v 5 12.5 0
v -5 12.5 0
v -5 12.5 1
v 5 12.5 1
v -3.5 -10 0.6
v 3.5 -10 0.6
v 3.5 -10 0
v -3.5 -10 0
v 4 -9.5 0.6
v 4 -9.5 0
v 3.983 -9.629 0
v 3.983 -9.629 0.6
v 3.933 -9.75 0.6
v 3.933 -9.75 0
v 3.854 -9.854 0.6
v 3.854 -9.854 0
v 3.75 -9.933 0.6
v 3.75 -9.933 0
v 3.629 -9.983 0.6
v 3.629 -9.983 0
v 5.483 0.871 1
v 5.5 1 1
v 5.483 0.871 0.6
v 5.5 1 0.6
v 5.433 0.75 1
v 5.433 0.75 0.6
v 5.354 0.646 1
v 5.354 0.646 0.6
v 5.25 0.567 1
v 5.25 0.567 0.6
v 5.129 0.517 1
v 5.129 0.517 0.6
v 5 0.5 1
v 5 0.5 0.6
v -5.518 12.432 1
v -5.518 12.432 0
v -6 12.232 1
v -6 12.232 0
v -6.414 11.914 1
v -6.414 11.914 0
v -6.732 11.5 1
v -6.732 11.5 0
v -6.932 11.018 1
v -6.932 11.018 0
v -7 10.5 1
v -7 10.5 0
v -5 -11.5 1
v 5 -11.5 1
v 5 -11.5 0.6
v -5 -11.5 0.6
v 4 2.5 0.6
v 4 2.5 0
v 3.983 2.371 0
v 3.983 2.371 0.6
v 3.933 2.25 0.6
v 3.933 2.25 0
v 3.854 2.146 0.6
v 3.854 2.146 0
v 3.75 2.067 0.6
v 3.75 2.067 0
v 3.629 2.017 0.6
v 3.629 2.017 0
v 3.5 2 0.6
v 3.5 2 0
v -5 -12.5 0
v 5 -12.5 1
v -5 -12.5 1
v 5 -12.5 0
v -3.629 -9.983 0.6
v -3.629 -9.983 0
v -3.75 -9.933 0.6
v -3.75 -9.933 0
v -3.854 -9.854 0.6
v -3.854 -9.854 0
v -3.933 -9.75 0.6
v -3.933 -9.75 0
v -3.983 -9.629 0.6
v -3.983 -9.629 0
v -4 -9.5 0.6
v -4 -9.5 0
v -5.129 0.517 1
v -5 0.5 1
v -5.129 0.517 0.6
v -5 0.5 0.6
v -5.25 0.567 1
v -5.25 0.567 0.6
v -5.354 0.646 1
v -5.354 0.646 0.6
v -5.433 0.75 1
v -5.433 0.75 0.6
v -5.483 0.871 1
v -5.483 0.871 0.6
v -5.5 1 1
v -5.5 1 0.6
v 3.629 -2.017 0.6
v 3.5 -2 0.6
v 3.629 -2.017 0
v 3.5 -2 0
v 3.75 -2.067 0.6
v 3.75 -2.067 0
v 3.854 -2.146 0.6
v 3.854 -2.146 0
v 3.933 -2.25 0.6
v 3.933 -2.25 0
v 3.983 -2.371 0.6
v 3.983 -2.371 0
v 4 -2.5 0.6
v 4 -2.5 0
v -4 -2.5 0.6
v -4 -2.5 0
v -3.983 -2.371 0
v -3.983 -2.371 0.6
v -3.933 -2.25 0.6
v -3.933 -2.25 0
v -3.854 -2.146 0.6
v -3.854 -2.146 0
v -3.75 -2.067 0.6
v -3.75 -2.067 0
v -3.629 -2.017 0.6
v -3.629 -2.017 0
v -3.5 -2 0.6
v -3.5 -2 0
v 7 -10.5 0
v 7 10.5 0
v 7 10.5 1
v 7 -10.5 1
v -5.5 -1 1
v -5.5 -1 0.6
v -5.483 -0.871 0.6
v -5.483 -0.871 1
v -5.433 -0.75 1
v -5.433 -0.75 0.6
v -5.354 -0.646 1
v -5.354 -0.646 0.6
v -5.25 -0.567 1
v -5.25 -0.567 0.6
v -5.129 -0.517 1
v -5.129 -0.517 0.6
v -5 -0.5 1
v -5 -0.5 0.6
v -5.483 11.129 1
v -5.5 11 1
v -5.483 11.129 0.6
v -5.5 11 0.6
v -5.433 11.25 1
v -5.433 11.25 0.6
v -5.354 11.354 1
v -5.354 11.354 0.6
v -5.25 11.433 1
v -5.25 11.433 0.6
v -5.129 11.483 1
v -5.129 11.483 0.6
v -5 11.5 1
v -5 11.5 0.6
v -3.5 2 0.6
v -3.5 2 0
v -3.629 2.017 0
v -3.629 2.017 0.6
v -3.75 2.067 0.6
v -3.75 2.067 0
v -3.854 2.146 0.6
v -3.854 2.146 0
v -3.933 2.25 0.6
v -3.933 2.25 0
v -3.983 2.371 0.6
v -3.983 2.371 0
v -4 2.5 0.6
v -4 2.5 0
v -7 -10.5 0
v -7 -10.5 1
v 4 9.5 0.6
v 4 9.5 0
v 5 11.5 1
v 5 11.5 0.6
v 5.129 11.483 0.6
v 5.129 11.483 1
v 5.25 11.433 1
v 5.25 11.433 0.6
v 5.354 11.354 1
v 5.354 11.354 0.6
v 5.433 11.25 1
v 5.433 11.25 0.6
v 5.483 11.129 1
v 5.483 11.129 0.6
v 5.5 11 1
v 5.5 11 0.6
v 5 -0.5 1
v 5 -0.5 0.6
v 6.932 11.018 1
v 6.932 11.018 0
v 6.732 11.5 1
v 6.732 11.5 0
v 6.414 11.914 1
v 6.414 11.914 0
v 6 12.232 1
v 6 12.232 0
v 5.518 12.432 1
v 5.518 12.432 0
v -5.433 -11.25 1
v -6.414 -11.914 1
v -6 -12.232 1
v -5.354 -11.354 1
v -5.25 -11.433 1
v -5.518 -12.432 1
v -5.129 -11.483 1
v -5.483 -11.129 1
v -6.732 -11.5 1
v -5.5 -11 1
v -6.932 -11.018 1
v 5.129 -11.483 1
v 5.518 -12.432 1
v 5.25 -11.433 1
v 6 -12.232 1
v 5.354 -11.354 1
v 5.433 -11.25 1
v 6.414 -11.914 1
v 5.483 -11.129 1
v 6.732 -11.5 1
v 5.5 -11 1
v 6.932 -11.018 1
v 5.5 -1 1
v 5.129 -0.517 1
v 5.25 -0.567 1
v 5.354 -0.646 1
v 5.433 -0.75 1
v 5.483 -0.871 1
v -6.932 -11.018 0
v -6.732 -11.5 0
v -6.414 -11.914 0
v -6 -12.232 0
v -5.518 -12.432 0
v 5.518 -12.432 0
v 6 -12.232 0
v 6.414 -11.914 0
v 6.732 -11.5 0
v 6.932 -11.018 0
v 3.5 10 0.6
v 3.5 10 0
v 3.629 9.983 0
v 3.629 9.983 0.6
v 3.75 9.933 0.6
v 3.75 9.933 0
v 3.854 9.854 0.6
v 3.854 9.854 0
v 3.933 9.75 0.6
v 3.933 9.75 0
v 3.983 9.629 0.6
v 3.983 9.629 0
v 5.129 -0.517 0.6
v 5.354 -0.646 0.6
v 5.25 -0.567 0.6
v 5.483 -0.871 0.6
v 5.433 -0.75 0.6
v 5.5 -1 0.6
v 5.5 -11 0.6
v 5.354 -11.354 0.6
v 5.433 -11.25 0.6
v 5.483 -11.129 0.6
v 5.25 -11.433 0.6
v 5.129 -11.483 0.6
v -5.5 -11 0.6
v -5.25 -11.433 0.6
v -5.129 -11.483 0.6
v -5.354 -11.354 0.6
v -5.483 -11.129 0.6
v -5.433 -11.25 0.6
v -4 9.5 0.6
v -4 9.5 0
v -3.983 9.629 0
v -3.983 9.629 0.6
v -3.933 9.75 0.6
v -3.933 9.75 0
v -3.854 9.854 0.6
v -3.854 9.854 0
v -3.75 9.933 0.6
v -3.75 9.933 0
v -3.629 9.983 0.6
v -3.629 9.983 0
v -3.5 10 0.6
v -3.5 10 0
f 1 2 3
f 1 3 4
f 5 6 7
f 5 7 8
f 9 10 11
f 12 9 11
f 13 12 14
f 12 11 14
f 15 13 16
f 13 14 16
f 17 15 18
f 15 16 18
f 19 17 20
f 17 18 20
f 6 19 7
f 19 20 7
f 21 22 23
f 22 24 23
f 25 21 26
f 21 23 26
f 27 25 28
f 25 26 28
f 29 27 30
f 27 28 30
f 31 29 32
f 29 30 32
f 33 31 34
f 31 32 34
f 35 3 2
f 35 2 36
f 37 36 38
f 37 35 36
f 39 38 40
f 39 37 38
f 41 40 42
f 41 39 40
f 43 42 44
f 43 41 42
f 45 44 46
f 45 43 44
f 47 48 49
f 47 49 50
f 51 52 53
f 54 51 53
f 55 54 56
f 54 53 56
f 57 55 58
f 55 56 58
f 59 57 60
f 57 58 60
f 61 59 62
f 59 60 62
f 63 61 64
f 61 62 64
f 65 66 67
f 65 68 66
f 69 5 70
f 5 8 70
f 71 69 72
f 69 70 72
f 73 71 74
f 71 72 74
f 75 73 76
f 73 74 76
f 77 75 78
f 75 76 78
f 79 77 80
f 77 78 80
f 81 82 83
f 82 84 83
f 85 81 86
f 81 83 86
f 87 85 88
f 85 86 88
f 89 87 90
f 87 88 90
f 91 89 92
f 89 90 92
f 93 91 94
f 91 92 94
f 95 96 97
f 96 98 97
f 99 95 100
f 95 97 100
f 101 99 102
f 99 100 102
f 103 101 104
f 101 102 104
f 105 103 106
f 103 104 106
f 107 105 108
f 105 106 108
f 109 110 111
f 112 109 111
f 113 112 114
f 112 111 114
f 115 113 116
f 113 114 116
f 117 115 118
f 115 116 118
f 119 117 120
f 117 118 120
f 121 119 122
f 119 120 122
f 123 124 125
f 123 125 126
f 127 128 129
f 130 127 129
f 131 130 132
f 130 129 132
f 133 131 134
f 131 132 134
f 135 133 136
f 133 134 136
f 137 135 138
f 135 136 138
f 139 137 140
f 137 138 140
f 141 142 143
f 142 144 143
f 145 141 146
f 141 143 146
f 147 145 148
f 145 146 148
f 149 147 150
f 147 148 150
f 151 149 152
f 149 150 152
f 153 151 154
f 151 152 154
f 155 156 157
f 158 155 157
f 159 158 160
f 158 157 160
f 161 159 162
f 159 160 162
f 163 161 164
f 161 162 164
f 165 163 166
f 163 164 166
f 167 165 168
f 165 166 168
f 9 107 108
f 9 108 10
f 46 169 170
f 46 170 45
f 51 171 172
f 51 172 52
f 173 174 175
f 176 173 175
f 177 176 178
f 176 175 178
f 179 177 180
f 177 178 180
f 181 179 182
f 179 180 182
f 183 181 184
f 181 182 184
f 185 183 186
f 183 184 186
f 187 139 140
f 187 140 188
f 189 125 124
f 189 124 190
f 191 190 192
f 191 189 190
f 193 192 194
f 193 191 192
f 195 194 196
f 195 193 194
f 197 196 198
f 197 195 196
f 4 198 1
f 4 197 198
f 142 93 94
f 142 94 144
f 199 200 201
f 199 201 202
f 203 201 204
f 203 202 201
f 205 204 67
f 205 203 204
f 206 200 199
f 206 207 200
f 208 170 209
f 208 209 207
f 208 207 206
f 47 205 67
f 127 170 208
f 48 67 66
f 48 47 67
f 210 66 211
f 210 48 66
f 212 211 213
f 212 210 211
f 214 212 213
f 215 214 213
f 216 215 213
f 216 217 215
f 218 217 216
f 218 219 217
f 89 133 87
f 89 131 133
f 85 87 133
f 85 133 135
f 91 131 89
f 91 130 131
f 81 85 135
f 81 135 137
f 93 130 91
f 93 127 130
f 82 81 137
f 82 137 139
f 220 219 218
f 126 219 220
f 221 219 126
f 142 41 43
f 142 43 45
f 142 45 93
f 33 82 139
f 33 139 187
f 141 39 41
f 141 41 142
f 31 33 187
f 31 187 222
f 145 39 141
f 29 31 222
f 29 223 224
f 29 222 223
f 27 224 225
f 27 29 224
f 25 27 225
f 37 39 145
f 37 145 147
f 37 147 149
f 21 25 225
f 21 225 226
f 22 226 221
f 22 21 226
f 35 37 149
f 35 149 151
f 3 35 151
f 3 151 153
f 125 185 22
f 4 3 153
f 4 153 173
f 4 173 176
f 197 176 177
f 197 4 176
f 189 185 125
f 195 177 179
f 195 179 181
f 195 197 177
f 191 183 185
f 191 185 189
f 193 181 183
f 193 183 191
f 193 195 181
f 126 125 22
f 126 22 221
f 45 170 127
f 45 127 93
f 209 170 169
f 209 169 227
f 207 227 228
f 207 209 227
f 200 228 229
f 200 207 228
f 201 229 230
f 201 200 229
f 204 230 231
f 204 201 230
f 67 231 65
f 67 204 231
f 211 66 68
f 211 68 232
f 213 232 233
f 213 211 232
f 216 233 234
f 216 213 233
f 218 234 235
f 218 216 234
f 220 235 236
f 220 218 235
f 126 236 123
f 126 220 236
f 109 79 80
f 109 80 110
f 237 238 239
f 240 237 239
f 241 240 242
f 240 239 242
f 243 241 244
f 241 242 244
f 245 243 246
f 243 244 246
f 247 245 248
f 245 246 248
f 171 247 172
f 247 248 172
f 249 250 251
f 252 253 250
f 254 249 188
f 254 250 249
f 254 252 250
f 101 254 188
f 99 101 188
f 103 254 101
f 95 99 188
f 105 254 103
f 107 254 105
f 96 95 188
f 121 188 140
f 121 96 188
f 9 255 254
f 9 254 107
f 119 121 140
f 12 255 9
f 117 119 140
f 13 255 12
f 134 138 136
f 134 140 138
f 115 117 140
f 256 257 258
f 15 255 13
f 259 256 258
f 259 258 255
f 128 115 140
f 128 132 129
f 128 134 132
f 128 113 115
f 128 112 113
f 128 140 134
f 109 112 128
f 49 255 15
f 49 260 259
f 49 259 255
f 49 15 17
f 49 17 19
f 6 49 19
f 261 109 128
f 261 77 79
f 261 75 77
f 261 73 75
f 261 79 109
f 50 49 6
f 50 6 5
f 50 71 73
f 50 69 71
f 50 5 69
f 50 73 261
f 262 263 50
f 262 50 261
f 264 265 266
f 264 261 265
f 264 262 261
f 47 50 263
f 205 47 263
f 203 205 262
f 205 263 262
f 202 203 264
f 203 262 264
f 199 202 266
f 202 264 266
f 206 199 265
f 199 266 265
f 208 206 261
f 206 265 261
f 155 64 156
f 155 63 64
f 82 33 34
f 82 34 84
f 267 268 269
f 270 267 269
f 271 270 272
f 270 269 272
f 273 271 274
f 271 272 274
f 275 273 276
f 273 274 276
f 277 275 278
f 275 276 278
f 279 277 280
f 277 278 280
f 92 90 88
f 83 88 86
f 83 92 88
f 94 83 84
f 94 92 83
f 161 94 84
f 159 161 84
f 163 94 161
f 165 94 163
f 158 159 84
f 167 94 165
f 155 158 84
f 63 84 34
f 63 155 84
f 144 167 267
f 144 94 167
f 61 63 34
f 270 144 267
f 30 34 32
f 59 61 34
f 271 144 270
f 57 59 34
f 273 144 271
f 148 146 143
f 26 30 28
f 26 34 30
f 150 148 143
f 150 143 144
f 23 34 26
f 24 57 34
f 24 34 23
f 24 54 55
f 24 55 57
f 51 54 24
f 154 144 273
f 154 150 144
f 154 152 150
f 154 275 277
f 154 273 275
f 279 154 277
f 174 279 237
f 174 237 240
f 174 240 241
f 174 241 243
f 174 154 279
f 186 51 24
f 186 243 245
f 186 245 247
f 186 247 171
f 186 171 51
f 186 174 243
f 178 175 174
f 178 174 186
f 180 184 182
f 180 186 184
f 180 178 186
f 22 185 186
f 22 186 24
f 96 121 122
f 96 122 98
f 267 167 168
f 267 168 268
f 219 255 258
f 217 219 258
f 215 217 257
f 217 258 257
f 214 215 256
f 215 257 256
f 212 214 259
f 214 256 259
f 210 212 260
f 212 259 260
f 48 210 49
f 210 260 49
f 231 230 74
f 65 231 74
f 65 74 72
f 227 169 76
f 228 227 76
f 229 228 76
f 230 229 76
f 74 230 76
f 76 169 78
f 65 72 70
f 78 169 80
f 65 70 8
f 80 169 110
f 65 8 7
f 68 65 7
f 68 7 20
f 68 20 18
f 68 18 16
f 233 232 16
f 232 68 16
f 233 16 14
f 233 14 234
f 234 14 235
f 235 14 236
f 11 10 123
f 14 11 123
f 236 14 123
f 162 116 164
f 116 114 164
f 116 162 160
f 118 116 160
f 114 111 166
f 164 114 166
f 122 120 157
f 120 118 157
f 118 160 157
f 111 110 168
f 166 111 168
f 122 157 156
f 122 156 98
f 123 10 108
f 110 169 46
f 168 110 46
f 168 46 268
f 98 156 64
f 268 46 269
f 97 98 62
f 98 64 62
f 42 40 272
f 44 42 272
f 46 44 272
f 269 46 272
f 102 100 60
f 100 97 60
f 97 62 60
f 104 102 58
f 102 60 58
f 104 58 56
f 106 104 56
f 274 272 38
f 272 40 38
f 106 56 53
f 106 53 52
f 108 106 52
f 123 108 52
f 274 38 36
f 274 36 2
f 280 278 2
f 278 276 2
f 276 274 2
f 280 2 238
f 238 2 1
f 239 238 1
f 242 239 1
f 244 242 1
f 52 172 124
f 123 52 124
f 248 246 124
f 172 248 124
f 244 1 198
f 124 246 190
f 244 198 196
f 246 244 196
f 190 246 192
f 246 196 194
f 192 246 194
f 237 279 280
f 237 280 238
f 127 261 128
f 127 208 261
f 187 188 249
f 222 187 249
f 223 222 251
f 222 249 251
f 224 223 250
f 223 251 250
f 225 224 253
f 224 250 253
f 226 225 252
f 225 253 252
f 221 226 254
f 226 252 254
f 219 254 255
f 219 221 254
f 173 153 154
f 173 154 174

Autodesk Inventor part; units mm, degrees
ref_plane "YZ Plane" through (0, 0, 0) normal (1, 0, 0) x (0, 1, 0)
ref_plane "XZ Plane" through (0, 0, 0) normal (0, 1, 0) x (-1, 0, 0)
ref_plane "XY Plane" through (0, 0, 0) normal (0, 0, 1) x (1, 0, 0)
sketch "Sketch1" plane through (0, 0, 0) normal (0, 0, 1) x (1, 0, 0)
  line L0 (-7, 12.5) -> (7, 12.5)
  line L1 (7, 12.5) -> (7, -12.5)
  line L2 (7, -12.5) -> (-7, -12.5)
  line L3 (-7, -12.5) -> (-7, 12.5)
  point P0 (0, 0)
  point P1 (7, 0)
  point P2 (0, 12.5)
  dimension "d0" = 14
  dimension "d1" = 25
extrude "Extrusion1" add sketch "Sketch1" along normal blind 1
sketch "Sketch2" plane through (0, 0, 1) normal (0, 0, 1) x (1, 0, 0)
  line L0 (-5.5, 11.5) -> (5.5, 11.5)
  line L1 (5.5, 11.5) -> (5.5, 0.5)
  line L2 (5.5, 0.5) -> (-5.5, 0.5)
  line L3 (-5.5, 0.5) -> (-5.5, 11.5)
  line L4 (7, 12.5) -> (-7, 12.5) projected
  point P0 (0, 0)
  point P1 (0, 11.5)
  dimension "d4" = 11
  dimension "d5" = 11
  dimension "d6" = 1
extrude "Extrusion2" cut sketch "Sketch2" against normal blind 0.4
sketch "Sketch3" plane through (0, 0, 0.6) normal (0, 0, 1) x (1, 0, 0)
  line L0 (5.5, 0.5) -> (-5.5, 0.5) projected
  line L1 (5.5, 11.5) -> (5.5, 0.5) projected
  line L2 (-5.5, 11.5) -> (5.5, 11.5) projected
  line L3 (-5.5, 0.5) -> (-5.5, 11.5) projected
  line L4 (4, 10) -> (4, 2)
  line L5 (4, 2) -> (-4, 2)
  line L6 (-4, 2) -> (-4, 10)
  line L7 (-4, 10) -> (4, 10)
  point P0 (0, 0)
  dimension "d9" = 1.5
extrude "Extrusion3" cut sketch "Sketch3" against normal through all contours L4 L5 L6 L7
mirror "Mirror1" about plane through (0, 0, 0) normal (0, 1, 0) of "Extrusion3", "Extrusion2"
fillet "Fillet1" radius 2 4 edges at (7, 12.5, 0.5) (7, -12.5, 0.5) (-7, -12.5, 0.5) (-7, 12.5, 0.5)
fillet "Fillet2" radius 0.5 8 edges at (-4, 2, 0.3) (-4, 10, 0.3) (4, 10, 0.3) (4, 2, 0.3) (4, -2, 0.3) (-4, -2, 0.3) (-4, -10, 0.3) (4, -10, 0.3)
fillet "Fillet3" radius 0.5 8 edges at (-5.5, 11.5, 0.8) (5.5, 11.5, 0.8) (5.5, 0.5, 0.8) (-5.5, 0.5, 0.8) (-5.5, -0.5, 0.8) (5.5, -0.5, 0.8) (5.5, -11.5, 0.8) (-5.5, -11.5, 0.8)
properties part number "SampleTray" material "UHMW, White"
